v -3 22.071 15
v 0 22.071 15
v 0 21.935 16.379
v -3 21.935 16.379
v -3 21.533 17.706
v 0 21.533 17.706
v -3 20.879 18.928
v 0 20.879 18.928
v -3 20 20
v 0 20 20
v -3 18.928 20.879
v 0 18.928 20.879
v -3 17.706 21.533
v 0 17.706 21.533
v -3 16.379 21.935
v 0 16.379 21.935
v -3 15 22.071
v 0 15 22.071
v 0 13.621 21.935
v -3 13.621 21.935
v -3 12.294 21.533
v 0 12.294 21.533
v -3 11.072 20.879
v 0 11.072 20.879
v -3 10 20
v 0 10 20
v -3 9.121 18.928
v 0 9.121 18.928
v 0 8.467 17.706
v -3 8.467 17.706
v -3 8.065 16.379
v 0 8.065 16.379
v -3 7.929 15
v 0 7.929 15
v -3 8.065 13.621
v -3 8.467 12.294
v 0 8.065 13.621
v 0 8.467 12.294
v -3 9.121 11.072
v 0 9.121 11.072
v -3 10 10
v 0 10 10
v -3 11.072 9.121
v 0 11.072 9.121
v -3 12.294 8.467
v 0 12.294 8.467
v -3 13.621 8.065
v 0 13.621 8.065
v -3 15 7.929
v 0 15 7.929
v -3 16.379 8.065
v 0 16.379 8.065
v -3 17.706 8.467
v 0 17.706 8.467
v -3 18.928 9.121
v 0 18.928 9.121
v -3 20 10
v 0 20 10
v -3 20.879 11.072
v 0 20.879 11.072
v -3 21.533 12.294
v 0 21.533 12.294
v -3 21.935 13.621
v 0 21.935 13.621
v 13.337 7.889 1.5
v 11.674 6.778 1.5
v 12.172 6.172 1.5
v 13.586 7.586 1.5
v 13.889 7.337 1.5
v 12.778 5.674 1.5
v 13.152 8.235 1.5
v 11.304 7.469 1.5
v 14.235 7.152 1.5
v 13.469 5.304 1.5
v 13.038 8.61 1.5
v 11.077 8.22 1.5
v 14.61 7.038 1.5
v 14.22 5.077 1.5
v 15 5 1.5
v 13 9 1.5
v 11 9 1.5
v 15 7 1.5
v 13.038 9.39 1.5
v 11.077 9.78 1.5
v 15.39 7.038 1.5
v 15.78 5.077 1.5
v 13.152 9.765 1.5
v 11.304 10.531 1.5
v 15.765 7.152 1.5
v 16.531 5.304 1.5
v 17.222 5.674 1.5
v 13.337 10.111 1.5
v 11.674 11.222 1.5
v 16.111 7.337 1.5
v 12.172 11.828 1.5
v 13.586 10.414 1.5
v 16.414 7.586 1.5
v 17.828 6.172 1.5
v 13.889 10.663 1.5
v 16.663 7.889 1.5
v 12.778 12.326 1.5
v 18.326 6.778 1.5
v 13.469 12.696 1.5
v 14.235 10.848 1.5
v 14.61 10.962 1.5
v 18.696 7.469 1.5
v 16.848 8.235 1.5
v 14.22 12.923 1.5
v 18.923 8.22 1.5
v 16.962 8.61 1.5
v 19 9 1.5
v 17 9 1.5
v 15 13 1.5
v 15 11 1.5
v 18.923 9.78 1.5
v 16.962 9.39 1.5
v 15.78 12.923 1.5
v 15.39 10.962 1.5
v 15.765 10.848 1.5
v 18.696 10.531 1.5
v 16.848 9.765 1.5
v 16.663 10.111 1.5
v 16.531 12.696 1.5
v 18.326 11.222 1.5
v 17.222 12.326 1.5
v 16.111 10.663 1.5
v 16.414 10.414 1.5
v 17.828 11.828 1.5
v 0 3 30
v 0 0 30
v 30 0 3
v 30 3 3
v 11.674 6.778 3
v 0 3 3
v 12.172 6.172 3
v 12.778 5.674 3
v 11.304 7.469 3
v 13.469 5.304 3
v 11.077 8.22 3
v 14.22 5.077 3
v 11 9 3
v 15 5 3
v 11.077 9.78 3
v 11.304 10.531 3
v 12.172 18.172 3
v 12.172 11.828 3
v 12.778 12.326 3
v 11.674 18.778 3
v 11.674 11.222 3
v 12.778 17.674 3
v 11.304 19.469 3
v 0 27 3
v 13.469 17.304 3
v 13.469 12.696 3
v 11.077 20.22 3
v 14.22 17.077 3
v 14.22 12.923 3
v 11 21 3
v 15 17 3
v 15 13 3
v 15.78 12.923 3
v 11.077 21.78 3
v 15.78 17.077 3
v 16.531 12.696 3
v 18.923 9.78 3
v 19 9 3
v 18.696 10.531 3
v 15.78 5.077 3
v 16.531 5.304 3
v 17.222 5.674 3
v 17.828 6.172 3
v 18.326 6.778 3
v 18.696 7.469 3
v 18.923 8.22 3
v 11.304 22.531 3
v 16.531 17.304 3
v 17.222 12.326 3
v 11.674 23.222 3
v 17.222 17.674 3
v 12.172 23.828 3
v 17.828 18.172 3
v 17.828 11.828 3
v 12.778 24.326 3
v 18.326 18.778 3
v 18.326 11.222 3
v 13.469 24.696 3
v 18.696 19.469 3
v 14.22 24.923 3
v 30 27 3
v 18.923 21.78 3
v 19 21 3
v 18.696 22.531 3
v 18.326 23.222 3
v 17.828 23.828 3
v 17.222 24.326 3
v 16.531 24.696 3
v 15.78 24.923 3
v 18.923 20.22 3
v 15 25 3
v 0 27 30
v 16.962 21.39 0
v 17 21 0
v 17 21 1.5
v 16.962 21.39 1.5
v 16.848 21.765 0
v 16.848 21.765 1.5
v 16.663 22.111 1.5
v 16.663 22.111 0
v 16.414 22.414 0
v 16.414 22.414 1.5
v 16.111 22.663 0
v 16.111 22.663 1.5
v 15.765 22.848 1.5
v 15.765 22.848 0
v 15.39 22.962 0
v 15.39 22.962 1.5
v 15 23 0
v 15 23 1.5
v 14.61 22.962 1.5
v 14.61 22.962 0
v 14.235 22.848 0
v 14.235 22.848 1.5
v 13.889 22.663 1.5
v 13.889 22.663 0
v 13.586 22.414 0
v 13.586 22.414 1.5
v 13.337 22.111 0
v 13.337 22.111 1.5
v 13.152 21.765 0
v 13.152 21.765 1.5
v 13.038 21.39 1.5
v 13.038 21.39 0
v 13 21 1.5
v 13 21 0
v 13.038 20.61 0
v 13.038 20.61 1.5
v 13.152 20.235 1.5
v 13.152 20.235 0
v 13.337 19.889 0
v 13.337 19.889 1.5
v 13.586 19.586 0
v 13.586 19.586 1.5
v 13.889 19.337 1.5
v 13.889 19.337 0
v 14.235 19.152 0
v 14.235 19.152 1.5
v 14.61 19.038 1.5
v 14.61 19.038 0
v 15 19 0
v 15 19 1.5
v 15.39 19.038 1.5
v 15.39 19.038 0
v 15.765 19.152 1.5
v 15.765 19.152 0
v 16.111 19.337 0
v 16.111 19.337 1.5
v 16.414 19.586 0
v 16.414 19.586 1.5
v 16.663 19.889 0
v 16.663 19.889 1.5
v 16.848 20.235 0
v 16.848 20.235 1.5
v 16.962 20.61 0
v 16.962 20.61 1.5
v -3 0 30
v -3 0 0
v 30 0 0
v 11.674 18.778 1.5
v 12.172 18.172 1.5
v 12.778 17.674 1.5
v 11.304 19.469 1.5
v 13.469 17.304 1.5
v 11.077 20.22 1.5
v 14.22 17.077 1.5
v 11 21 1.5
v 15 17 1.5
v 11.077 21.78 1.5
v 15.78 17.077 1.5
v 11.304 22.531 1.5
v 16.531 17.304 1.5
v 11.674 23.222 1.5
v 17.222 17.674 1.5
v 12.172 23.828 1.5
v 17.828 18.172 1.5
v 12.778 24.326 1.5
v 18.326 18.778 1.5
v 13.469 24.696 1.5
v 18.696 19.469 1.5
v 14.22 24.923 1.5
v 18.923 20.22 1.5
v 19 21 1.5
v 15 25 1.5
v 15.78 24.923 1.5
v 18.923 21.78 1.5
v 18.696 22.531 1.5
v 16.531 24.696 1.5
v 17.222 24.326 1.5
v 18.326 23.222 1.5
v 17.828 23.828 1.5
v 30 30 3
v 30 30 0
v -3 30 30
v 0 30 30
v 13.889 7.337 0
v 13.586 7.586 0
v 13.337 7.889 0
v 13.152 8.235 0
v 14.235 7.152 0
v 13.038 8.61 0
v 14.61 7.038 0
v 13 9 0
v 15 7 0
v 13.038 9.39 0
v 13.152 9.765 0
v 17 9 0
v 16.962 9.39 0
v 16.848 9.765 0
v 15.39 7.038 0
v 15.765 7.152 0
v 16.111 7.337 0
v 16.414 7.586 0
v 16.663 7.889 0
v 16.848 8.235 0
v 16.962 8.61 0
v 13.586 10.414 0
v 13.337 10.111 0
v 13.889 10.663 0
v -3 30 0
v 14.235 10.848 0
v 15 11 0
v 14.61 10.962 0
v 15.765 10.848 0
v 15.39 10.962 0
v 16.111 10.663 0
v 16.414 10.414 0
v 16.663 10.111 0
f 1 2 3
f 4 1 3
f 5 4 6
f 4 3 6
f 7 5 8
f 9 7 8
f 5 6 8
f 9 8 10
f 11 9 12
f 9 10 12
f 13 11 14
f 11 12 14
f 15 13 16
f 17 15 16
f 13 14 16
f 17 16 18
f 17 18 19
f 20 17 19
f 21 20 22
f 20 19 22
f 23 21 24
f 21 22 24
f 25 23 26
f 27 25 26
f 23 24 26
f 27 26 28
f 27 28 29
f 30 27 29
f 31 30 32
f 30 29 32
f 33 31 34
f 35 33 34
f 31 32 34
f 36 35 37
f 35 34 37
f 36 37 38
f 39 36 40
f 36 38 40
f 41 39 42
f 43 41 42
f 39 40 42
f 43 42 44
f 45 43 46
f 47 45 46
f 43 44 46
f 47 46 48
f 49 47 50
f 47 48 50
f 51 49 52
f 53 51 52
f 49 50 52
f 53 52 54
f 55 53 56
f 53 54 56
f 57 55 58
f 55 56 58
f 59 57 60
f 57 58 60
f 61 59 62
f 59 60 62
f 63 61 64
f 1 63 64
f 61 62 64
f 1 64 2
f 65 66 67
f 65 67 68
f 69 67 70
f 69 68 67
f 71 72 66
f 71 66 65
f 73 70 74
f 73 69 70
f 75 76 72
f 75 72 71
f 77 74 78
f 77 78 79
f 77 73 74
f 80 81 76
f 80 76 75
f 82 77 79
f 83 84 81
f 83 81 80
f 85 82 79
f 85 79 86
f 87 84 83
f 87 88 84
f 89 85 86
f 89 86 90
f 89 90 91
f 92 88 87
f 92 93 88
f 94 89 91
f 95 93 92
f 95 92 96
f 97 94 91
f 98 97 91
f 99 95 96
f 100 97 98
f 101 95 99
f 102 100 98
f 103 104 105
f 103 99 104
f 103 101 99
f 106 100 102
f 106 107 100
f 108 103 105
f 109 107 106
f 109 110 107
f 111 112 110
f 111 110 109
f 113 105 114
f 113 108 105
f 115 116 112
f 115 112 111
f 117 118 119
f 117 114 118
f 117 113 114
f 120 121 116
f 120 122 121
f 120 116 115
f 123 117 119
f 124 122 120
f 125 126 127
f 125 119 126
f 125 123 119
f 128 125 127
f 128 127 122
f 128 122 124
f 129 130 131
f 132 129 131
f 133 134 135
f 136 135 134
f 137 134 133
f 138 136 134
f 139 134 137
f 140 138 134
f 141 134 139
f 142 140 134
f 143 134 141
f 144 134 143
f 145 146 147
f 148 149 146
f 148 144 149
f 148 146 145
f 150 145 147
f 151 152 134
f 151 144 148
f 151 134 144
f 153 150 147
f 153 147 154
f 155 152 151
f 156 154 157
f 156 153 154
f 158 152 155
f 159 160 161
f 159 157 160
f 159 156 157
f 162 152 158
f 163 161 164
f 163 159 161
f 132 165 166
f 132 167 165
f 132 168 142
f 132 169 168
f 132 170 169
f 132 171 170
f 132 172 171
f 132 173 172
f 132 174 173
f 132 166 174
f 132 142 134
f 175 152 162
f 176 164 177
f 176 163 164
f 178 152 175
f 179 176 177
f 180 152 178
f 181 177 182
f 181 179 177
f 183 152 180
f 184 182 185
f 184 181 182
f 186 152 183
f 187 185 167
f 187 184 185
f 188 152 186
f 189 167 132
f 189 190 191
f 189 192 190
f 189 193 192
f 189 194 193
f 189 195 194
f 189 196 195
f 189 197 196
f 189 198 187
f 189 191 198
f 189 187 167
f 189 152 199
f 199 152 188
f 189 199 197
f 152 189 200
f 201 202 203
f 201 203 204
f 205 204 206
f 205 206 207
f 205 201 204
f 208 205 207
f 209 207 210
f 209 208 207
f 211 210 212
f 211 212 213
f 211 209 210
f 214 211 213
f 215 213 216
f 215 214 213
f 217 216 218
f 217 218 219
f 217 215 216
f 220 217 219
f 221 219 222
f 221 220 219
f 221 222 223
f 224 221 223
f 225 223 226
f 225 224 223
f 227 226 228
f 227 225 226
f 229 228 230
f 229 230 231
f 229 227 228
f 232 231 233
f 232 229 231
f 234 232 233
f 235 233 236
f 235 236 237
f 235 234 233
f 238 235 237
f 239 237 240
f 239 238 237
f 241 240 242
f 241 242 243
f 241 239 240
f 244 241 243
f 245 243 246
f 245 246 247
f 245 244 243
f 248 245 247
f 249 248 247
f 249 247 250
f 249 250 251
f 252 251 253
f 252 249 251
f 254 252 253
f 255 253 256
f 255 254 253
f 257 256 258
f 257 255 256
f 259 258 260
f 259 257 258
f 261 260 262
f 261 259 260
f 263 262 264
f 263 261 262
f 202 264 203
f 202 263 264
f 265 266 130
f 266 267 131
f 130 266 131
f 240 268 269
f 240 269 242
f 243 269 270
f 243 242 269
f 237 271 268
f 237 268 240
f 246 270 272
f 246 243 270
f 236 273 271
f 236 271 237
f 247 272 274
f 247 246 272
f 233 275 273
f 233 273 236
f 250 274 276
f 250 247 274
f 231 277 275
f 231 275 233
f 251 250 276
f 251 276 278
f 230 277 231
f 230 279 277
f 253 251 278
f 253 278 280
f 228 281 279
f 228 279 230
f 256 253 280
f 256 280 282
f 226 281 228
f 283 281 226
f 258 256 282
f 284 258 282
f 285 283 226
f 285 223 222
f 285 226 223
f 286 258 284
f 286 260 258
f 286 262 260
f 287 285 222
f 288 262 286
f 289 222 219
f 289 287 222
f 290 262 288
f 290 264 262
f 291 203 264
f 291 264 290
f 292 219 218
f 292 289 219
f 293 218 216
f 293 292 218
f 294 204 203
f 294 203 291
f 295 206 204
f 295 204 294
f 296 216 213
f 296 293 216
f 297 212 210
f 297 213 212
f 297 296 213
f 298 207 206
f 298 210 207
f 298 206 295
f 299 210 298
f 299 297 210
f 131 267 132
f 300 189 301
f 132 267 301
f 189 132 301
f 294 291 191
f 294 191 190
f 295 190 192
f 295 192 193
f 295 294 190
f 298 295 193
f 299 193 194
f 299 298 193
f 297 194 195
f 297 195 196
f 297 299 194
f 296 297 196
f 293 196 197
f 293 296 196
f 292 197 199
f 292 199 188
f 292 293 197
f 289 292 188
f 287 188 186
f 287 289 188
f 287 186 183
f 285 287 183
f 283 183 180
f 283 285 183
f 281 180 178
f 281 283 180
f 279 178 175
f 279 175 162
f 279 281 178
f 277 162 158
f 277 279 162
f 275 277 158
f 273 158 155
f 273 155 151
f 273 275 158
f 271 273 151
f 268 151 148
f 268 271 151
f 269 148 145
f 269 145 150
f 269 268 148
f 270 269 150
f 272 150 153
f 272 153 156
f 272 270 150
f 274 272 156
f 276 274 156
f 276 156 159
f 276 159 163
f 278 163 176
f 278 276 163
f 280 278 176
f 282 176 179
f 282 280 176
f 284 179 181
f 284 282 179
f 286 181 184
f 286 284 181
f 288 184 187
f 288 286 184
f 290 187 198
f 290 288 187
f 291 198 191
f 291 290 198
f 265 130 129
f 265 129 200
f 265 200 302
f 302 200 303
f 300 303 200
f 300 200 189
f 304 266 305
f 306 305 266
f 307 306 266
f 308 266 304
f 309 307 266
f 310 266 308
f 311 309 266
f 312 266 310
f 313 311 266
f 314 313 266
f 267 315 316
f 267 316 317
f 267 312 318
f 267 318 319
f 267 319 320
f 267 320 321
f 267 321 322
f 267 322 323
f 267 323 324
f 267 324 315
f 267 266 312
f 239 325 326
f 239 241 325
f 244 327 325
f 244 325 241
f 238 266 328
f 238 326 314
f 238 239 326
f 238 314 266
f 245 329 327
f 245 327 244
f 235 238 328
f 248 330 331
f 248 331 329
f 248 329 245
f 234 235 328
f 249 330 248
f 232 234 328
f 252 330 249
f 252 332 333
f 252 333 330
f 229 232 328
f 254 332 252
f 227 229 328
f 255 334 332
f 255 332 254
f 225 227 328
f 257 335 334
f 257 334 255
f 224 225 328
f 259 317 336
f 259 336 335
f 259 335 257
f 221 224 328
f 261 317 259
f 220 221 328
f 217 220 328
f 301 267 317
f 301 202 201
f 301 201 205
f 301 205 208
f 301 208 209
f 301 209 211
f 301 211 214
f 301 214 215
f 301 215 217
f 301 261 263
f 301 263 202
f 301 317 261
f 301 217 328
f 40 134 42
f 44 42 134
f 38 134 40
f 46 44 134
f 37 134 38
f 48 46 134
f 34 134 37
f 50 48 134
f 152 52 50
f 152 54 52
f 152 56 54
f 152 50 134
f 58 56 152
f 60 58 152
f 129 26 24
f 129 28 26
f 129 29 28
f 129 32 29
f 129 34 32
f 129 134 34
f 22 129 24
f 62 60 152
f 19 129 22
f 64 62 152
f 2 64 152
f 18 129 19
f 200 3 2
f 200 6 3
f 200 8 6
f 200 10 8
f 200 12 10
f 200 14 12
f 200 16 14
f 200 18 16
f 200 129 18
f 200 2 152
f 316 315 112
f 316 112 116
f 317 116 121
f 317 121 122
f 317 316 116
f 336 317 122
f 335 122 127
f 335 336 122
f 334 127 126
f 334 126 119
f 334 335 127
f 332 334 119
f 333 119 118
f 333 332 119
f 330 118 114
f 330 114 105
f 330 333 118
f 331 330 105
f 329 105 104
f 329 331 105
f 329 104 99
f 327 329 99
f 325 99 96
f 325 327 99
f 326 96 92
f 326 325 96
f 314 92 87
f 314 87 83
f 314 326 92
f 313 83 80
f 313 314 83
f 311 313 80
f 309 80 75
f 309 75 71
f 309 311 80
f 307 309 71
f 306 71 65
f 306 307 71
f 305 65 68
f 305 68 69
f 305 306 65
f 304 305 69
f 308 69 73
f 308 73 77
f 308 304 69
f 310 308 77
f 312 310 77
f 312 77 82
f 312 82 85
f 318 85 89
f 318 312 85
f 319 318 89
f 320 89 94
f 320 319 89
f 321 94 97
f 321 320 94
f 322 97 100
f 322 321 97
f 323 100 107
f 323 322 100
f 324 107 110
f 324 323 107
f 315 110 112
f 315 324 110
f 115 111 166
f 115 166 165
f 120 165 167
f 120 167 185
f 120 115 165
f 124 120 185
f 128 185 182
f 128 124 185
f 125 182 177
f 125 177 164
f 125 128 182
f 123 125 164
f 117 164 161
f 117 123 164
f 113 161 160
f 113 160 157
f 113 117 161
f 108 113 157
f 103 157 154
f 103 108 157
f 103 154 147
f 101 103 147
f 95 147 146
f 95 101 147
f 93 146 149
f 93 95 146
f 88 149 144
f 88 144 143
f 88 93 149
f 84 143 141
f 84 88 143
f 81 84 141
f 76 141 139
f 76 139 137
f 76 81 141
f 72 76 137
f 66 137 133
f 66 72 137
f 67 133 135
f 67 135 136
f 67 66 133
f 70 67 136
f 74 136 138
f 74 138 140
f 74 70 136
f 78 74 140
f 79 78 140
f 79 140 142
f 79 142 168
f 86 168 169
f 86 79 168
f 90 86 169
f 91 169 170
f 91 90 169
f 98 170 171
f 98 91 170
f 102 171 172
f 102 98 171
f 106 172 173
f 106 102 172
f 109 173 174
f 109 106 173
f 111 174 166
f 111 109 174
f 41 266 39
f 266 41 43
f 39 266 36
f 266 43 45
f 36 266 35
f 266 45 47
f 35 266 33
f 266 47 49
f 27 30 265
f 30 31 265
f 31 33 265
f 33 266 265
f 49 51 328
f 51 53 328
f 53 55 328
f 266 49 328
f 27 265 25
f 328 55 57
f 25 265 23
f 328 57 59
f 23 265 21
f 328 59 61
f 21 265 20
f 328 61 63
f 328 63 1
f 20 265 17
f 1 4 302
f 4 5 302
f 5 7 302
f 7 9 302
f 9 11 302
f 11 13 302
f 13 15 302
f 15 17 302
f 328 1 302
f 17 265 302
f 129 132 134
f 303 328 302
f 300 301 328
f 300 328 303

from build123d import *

# Parameters (mm, degrees)
SKETCH003_R      = 2
EXTRUDE003_DEPTH = 1.5
SKETCH004_R      = 4
EXTRUDE004_DEPTH = 1.5
EXTRUDE001_DEPTH = 3
SKETCH002_W      = 30
SKETCH002_H      = 30
SKETCH002_R      = 7.071068
EXTRUDE002_DEPTH = 3
SKETCH_W         = 30
SKETCH_H         = 30
EXTRUDE_DEPTH    = 3


with BuildPart() as furo:
    # Sketch003 → Extrude003 (new body)
    with BuildSketch(Plane.XY):
        with Locations((15, 21)):
            Circle(SKETCH003_R)
        with Locations((15, 9)):
            Circle(SKETCH003_R)
    extrude(amount=EXTRUDE003_DEPTH)


with BuildPart() as fusion:
    # Sketch004 → Extrude004 (new body)
    with BuildSketch(Plane.XY.offset(1.5)):
        with Locations((15, 21)):
            Circle(SKETCH004_R)
        with Locations((15, 9)):
            Circle(SKETCH004_R)
    extrude(amount=EXTRUDE004_DEPTH)

    # Fusion: union Furo
    add(furo.part)


with BuildPart() as lateral:
    # Sketch001 → Extrude001 (new body)
    with BuildSketch(Plane.XZ):
        Polygon((0, 3), (0, 30), (30, 3), align=None)
    extrude(amount=-EXTRUDE001_DEPTH)


with BuildPart() as lateral_mirrored:
    # mirror: instance of Lateral
    add(lateral.part.mirror(Plane(origin=(30, 15, 0), x_dir=(-1, 0, 0), z_dir=(0, -1, 0))))


with BuildPart() as frontal:
    # Sketch002 → Extrude002 (new body)
    with BuildSketch(Plane.YZ):
        with Locations((15, 15)):
            Rectangle(SKETCH002_W, SKETCH002_H)
        with Locations((15, 15)):
            Circle(SKETCH002_R, mode=Mode.SUBTRACT)
    extrude(amount=-EXTRUDE002_DEPTH)


with BuildPart() as cut:
    # Sketch → Extrude (new body)
    with BuildSketch(Plane.XY):
        with Locations((15, 15)):
            Rectangle(SKETCH_W, SKETCH_H)
    extrude(amount=EXTRUDE_DEPTH)

    # Fusion001: union Lateral (mirrored), Lateral, Frontal
    add(lateral_mirrored.part)
    add(lateral.part)
    add(frontal.part)

    # Cut: cut Fusion
    add(fusion.part, mode=Mode.SUBTRACT)


solid = cut.part
